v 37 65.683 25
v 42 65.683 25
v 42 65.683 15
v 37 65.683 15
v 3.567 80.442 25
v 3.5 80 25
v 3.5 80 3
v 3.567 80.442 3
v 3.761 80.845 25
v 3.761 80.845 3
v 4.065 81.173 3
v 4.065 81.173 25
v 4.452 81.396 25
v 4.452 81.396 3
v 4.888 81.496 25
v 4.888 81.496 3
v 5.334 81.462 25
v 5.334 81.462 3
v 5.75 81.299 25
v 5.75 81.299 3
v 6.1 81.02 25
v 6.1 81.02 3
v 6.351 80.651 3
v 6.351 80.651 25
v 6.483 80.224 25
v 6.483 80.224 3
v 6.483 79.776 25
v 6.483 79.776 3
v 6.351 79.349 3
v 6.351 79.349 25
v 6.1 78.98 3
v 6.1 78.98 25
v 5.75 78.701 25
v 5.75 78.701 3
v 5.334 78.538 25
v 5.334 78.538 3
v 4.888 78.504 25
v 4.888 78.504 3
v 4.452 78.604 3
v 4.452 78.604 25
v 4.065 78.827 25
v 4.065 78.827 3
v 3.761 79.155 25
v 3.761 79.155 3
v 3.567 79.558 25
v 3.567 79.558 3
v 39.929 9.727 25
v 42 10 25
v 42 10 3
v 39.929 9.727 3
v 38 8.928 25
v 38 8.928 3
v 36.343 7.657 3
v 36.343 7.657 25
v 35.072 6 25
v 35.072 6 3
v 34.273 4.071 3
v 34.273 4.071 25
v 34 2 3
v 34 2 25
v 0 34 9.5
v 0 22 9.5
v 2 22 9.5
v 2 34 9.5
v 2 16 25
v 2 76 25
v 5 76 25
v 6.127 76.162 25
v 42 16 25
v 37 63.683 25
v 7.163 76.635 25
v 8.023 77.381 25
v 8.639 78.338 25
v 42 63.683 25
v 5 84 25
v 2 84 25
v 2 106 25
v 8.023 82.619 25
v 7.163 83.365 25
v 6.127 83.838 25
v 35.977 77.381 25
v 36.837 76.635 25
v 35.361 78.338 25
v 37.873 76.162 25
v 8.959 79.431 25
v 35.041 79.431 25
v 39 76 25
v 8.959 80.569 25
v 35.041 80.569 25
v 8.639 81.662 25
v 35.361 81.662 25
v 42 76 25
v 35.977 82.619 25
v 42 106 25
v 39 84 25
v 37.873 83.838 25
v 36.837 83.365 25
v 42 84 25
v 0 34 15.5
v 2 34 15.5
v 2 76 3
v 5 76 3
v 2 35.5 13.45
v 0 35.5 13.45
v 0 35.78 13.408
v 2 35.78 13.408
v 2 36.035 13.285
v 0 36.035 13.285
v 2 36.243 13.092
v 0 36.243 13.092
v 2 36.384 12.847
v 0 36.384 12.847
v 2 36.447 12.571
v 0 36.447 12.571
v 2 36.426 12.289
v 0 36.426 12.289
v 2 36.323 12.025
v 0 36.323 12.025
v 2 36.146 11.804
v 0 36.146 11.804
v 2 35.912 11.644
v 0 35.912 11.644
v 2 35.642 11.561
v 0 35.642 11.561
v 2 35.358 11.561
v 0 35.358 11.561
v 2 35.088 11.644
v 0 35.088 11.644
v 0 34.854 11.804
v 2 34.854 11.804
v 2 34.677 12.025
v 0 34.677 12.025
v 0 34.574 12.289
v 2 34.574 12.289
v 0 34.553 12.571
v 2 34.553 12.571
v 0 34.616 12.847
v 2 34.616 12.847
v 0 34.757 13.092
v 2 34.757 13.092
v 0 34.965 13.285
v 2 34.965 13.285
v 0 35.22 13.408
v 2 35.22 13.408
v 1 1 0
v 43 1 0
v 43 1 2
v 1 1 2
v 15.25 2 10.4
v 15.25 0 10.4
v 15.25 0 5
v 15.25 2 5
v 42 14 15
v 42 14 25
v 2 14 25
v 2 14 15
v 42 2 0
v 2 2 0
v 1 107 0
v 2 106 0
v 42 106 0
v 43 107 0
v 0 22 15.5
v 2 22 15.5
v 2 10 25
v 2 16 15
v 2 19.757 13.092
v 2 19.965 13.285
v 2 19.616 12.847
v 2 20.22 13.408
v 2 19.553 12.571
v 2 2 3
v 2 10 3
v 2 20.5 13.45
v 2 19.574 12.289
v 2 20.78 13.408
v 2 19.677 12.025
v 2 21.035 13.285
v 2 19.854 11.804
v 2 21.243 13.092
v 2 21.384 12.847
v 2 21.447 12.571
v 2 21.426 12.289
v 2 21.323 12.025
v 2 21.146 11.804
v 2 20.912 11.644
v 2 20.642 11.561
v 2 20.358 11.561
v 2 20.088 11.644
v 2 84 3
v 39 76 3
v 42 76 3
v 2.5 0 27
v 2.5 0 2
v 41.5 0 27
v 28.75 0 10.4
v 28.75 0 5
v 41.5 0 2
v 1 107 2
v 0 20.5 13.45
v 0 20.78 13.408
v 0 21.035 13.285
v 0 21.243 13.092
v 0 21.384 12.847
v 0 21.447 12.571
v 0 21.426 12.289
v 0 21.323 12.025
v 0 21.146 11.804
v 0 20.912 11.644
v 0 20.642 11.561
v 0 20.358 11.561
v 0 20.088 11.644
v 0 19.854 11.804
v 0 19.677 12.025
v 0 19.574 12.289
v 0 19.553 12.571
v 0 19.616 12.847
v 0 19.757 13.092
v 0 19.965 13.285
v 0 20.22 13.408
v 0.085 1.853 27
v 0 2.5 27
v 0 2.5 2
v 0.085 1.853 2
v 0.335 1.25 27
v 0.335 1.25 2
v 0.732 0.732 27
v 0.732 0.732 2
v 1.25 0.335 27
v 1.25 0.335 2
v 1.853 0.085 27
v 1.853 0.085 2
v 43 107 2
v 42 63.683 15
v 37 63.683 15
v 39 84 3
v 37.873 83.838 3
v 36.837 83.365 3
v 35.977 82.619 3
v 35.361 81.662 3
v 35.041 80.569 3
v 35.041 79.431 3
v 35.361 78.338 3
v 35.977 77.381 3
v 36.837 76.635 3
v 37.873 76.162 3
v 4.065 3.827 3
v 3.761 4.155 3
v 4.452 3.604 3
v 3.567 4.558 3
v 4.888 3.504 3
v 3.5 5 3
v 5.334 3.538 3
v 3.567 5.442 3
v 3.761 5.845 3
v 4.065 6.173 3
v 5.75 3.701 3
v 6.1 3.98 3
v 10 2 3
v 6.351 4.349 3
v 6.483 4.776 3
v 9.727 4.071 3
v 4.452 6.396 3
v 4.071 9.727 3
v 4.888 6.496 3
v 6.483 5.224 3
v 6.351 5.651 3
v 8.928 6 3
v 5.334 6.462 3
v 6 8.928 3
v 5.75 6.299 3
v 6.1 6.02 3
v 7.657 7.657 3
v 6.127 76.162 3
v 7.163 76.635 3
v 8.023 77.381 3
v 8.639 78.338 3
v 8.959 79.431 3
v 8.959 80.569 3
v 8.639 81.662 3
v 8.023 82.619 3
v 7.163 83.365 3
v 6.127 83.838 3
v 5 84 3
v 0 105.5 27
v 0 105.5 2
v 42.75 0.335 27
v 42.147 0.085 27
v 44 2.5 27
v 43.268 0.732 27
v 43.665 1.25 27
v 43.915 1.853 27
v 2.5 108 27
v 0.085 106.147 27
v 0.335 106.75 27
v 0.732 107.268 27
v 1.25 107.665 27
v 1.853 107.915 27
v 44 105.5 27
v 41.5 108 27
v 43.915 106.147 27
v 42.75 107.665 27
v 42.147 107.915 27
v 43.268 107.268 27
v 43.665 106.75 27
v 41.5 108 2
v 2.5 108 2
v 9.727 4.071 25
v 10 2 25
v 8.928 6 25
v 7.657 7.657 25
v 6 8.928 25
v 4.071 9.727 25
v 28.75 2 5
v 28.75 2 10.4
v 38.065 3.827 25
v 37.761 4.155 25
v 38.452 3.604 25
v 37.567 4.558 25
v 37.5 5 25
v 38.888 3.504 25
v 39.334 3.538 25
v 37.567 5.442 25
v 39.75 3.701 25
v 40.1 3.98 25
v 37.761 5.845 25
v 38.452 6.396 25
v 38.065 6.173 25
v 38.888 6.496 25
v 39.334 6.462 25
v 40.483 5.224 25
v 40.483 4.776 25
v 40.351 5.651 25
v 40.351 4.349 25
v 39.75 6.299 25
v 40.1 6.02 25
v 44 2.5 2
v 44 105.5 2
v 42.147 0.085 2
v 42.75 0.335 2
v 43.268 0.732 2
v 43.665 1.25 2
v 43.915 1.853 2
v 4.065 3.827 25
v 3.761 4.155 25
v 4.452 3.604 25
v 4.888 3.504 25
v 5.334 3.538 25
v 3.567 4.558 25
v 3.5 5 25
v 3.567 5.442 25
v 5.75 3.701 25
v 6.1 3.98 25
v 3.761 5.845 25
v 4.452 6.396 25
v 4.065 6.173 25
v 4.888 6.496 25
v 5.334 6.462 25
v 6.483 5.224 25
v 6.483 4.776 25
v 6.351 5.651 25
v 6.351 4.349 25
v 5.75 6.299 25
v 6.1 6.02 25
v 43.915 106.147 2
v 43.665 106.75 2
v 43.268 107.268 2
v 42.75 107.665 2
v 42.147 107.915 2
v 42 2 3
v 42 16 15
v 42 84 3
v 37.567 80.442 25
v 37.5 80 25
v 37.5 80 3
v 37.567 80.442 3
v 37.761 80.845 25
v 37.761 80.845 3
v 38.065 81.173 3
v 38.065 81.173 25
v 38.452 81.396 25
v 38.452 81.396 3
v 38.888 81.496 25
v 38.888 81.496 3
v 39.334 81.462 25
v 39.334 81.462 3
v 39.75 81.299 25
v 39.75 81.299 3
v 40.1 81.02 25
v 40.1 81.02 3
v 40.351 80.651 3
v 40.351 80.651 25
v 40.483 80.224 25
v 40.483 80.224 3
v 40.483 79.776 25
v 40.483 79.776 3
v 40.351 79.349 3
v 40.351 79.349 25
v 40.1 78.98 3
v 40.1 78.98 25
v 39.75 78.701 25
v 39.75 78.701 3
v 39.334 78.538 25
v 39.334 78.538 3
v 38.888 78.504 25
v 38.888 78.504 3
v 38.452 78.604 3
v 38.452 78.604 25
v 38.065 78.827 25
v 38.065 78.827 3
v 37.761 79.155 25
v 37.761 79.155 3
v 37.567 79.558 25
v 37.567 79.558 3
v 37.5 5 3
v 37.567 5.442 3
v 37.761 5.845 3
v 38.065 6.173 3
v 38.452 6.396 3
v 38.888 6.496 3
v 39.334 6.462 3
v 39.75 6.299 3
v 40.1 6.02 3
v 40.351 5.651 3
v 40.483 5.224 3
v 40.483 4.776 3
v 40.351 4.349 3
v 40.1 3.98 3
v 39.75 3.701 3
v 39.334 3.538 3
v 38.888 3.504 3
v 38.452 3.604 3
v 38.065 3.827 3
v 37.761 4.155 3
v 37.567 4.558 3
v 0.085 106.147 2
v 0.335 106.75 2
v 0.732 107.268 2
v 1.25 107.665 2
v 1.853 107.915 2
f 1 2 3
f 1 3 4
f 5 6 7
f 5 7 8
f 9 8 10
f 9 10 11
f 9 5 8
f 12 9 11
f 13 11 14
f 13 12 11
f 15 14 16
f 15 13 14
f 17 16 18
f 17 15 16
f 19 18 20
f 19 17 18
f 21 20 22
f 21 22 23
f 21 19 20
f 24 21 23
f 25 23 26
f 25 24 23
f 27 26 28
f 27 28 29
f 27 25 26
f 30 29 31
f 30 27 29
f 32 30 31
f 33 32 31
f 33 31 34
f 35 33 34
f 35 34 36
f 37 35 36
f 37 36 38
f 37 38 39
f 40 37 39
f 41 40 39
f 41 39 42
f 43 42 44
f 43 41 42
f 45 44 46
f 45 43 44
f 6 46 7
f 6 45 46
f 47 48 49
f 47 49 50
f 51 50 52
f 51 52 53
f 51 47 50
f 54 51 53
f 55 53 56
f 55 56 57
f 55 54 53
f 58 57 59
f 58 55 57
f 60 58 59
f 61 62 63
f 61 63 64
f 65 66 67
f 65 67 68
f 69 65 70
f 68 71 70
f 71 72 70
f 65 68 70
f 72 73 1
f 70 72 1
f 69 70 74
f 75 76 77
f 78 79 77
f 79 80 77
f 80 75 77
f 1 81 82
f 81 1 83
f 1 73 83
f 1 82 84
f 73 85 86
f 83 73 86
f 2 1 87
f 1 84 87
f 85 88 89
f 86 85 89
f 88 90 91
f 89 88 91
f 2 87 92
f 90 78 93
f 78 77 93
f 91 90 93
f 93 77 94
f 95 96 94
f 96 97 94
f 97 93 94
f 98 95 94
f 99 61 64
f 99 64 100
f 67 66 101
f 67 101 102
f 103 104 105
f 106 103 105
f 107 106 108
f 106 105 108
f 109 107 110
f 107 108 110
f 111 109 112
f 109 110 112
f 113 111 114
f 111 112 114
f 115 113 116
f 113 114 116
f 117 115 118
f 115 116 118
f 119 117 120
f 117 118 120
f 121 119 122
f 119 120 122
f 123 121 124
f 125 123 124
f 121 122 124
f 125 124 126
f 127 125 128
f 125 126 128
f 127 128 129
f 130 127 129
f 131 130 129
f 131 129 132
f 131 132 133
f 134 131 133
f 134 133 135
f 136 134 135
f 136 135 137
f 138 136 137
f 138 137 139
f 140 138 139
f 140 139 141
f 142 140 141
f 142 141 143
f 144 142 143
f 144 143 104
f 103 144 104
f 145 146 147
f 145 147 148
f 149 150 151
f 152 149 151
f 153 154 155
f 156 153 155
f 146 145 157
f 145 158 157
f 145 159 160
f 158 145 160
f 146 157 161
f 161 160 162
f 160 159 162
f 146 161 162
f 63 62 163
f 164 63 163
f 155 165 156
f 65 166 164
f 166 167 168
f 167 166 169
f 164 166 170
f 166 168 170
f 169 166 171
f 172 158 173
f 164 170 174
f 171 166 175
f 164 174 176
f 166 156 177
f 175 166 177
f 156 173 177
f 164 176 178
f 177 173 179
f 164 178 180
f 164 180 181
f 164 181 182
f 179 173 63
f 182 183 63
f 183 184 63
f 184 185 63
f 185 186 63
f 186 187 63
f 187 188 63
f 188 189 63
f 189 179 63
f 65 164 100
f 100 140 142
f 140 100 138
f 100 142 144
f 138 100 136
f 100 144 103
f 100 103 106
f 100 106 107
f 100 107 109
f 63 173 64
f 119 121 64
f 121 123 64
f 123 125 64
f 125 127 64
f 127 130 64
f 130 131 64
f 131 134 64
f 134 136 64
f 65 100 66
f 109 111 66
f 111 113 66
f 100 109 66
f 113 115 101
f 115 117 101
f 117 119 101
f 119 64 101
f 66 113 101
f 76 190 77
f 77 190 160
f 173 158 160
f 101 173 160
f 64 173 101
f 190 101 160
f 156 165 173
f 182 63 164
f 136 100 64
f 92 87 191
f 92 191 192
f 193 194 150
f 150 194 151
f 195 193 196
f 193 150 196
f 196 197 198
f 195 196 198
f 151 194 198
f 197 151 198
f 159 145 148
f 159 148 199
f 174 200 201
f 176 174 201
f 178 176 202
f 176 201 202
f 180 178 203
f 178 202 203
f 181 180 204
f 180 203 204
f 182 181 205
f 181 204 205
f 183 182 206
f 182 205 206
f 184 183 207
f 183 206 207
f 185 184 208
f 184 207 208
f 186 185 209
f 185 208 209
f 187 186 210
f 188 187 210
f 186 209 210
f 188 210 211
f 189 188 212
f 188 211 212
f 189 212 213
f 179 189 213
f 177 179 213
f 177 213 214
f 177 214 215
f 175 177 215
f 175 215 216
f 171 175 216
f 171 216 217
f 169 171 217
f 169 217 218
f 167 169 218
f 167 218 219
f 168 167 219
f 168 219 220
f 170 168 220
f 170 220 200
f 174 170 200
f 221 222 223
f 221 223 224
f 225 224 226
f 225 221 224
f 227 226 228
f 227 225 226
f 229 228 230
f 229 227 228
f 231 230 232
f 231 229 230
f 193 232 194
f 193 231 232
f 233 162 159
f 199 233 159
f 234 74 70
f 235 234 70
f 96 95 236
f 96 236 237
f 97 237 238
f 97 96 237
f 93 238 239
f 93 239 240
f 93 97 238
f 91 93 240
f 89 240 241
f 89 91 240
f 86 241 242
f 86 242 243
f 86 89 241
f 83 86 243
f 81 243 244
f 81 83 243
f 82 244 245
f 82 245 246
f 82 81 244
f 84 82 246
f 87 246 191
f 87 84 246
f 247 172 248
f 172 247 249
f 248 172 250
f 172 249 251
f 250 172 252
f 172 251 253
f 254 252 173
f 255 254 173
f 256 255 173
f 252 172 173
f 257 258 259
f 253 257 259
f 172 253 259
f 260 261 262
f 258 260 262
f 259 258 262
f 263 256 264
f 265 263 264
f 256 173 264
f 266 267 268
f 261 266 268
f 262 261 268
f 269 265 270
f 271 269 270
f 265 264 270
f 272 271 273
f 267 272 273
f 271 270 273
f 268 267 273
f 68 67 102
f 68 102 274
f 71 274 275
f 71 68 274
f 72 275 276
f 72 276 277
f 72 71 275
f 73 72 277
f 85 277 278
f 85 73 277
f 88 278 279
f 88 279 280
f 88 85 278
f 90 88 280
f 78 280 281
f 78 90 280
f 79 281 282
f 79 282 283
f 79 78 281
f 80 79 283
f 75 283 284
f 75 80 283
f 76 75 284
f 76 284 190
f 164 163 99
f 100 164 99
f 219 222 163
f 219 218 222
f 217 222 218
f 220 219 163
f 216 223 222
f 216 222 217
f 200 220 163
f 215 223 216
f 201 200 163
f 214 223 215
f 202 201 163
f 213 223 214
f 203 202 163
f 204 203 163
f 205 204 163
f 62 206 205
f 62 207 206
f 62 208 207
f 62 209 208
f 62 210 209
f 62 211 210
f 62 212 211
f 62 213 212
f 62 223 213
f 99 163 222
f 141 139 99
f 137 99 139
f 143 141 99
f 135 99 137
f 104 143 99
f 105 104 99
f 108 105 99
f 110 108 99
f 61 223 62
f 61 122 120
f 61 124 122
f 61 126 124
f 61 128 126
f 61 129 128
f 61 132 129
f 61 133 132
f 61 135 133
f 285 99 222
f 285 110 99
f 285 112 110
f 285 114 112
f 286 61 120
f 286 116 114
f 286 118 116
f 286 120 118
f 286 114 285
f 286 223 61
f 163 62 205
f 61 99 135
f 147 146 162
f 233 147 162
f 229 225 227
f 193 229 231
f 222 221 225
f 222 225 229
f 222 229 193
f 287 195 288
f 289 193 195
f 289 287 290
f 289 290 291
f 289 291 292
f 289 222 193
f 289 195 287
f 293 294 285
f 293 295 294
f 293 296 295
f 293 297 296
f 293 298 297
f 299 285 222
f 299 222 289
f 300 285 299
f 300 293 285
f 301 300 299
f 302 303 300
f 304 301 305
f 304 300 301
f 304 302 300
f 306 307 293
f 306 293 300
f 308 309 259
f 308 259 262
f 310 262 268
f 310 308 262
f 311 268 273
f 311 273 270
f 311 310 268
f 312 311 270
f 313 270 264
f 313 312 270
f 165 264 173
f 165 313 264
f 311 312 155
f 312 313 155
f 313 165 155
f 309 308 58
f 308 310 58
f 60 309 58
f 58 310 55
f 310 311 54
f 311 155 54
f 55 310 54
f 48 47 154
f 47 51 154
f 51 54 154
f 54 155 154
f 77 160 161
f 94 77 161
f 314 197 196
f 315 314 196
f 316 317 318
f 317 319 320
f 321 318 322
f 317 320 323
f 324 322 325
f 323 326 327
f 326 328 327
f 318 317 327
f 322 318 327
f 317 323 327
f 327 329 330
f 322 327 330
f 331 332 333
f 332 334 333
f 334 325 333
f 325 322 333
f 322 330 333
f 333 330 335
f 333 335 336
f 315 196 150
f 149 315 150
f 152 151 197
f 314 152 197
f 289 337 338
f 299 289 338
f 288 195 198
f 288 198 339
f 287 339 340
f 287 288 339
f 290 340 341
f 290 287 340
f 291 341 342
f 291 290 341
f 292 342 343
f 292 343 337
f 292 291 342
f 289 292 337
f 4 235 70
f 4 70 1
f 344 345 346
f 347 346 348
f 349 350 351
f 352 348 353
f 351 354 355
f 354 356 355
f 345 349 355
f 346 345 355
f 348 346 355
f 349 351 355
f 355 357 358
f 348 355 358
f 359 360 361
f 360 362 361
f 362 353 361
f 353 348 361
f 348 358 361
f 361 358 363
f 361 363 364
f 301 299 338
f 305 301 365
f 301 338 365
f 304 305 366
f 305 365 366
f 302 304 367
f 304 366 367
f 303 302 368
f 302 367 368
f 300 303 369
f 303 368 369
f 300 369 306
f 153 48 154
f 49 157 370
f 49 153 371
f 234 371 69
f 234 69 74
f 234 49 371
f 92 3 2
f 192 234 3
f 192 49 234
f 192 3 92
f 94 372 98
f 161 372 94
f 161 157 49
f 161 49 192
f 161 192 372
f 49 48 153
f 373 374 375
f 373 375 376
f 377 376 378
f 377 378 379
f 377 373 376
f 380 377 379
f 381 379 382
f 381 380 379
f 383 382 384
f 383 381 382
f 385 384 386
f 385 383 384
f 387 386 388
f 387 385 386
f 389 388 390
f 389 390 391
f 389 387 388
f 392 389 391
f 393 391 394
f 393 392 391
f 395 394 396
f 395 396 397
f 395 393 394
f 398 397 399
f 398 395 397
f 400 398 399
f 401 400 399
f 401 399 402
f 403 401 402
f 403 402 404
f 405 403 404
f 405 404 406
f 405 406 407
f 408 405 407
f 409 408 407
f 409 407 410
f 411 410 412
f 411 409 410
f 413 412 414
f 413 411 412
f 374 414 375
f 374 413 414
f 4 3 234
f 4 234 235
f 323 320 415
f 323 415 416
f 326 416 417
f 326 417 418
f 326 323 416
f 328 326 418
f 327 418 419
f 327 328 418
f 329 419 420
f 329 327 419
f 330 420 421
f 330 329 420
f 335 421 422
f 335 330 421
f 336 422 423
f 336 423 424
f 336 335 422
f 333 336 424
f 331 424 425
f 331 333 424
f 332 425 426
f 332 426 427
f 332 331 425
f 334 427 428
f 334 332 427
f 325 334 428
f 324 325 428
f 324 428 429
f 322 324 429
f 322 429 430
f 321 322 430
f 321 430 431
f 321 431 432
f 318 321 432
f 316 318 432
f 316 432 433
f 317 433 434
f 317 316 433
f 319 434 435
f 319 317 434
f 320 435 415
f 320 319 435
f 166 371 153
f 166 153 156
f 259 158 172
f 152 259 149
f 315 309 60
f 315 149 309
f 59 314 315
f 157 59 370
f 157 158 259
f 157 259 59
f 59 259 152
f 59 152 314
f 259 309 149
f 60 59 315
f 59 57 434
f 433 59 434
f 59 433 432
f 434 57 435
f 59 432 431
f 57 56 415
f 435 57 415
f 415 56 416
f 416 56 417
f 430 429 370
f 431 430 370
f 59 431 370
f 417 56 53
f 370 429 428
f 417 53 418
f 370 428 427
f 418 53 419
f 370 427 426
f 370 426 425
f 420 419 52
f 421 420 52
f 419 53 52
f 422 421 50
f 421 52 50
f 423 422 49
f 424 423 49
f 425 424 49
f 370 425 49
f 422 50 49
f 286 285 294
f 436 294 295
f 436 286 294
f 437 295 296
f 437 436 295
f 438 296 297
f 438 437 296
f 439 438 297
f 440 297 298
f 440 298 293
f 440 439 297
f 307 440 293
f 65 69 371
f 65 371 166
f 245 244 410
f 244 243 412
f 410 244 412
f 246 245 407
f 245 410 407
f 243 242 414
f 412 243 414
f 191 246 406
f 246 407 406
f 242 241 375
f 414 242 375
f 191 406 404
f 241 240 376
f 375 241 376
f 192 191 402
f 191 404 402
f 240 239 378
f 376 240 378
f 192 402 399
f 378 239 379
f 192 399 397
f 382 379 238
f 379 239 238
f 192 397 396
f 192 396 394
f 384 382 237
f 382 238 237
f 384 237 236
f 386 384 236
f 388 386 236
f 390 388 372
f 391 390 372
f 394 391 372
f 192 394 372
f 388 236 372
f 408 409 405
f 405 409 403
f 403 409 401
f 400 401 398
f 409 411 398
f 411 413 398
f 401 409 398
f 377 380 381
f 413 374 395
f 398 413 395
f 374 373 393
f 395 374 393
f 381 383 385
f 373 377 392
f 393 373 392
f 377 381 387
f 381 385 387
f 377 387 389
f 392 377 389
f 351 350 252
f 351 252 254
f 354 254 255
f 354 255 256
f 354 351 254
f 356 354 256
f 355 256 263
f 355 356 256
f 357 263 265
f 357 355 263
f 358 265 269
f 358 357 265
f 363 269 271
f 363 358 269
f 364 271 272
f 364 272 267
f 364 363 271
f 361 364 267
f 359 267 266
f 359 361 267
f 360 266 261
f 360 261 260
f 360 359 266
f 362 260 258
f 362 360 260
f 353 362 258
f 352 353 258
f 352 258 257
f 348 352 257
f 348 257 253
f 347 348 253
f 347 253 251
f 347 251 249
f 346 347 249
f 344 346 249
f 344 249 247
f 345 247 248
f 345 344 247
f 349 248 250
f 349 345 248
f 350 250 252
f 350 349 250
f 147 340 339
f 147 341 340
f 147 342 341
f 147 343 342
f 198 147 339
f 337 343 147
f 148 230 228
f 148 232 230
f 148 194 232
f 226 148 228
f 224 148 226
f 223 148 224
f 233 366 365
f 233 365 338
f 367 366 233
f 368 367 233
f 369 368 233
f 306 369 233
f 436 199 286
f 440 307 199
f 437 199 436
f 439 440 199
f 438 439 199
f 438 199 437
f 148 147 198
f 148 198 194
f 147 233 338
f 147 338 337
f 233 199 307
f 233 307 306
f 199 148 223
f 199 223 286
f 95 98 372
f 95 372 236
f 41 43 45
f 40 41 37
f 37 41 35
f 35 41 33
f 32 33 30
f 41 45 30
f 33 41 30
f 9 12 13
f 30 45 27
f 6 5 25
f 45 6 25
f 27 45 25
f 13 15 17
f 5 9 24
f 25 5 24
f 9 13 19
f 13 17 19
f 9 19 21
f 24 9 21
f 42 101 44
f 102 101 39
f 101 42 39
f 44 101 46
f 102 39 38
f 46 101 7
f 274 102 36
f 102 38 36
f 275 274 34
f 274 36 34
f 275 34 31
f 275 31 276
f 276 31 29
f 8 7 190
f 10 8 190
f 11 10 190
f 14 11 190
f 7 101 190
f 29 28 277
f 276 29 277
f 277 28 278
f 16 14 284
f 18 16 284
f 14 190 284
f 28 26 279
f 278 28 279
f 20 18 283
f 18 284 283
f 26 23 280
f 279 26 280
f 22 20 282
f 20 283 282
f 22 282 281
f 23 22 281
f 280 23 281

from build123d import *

# Parameters (mm, degrees)
SKICA1_W                 = 44
SKICA1_H                 = 108
SKICA1_W_2               = 40
SKICA1_H_2               = 104
P_IDAT_VYSUNUT_M1_DEPTH  = 25
SKICA2_W                 = 44
SKICA2_H                 = 108
P_IDAT_VYSUNUT_M2_DEPTH  = 2
ZAOBLIT1_R               = 2.5
SKICA3_W                 = 44
SKICA3_H                 = 108
SKICA3_W_2               = 42
SKICA3_H_2               = 106
ODEBRAT_VYSUNUT_M1_DEPTH = 2
SKICA4_R                 = 1.5
P_IDAT_VYSUNUT_M3_DEPTH  = 22
ODEBRAT_VYSUNUT_M2_DEPTH = 10
SKICA7_W                 = 40
SKICA7_H                 = 2
SKICA7_W_2               = 5
P_IDAT_VYSUNUT_M4_DEPTH  = 10
SKICA8_R                 = 0.95
SKICA8_W                 = 6
SKICA8_H                 = 12
ODEBRAT_VYSUNUT_M3_DEPTH = 10


with BuildPart() as part:
    # Skica1 → Přidat vysunutím1 (new body)
    with BuildSketch(Plane.XY):
        with Locations((22, 54)):
            Rectangle(SKICA1_W, SKICA1_H)
        with Locations((22, 54)):
            Rectangle(SKICA1_W_2, SKICA1_H_2, mode=Mode.SUBTRACT)
    extrude(amount=P_IDAT_VYSUNUT_M1_DEPTH)

    # Skica2 → Přidat vysunutím2 (add)
    with BuildSketch(Plane.XY.offset(25)):
        with Locations((22, 54)):
            Rectangle(SKICA2_W, SKICA2_H)
    extrude(amount=P_IDAT_VYSUNUT_M2_DEPTH)

    # Zaoblit1
    zaoblit1_edges = [part.edges().sort_by_distance(p)[0] for p in [
        (0, 108, 13.5),
        (44, 108, 13.5),
        (44, 0, 13.5),
        (0, 0, 13.5),
    ]]
    fillet(zaoblit1_edges, radius=ZAOBLIT1_R)

    # Skica3 → Odebrat vysunutím1 (cut)
    with BuildSketch(Plane(origin=(0, 0, 0), x_dir=(-1, 0, 0), z_dir=(0, 0, -1))):
        with Locations((-22, 54)):
            Rectangle(SKICA3_W, SKICA3_H)
        with Locations((-22, 54)):
            Rectangle(SKICA3_W_2, SKICA3_H_2, mode=Mode.SUBTRACT)
    extrude(amount=-ODEBRAT_VYSUNUT_M1_DEPTH, mode=Mode.SUBTRACT)

    # Skica4 → Přidat vysunutím3 (add)
    with BuildSketch(Plane(origin=(0, 0, 25), x_dir=(-1, 0, 0), z_dir=(0, 0, -1))):
        with BuildLine():
            Line((-42, 2), (-42, 10))
            ThreePointArc((-42, 10), (-36.343145751, 7.656854249), (-34, 2))
            Line((-34, 2), (-42, 2))
        make_face()
        with Locations((-39, 5)):
            Circle(SKICA4_R, mode=Mode.SUBTRACT)
        with BuildLine():
            Line((-2, 2), (-10, 2))
            ThreePointArc((-10, 2), (-7.656854249, 7.656854249), (-2, 10))
            Line((-2, 10), (-2, 2))
        make_face()
        with Locations((-5, 5)):
            Circle(SKICA4_R, mode=Mode.SUBTRACT)
        with BuildLine():
            Line((-2, 80), (-2, 76))
            Line((-2, 76), (-5, 76))
            ThreePointArc((-5, 76), (-9, 80), (-5, 84))
            Line((-5, 84), (-2, 84))
            Line((-2, 84), (-2, 80))
        make_face()
        with Locations((-5, 80)):
            Circle(SKICA4_R, mode=Mode.SUBTRACT)
        with BuildLine():
            Line((-42, 84), (-39, 84))
            ThreePointArc((-39, 84), (-35, 80), (-39, 76))
            Line((-39, 76), (-42, 76))
            Line((-42, 76), (-42, 84))
        make_face()
        with Locations((-39, 80)):
            Circle(SKICA4_R, mode=Mode.SUBTRACT)
    extrude(amount=P_IDAT_VYSUNUT_M3_DEPTH)

    # Skica6 → Odebrat vysunutím2 (cut)
    with BuildSketch(Plane.XZ):
        Polygon((22, 10.4), (15.25, 10.4), (15.25, 5), (28.75, 5), (28.75, 10.4), align=None)
    extrude(amount=-ODEBRAT_VYSUNUT_M2_DEPTH, mode=Mode.SUBTRACT)

    # Skica7 → Přidat vysunutím4 (add)
    with BuildSketch(Plane(origin=(0, 0, 25), x_dir=(-1, 0, 0), z_dir=(0, 0, -1))):
        with Locations((-22, 15)):
            Rectangle(SKICA7_W, SKICA7_H)
        with Locations((-39.5, 64.682971934)):
            Rectangle(SKICA7_W_2, SKICA7_H)
    extrude(amount=P_IDAT_VYSUNUT_M4_DEPTH)

    # Skica8 → Odebrat vysunutím3 (cut)
    with BuildSketch(Plane.ZY):
        with Locations((12.5, 35.5)):
            Circle(SKICA8_R)
        with Locations((12.5, 20.5)):
            Circle(SKICA8_R)
        with Locations((12.5, 28)):
            Rectangle(SKICA8_W, SKICA8_H)
    extrude(amount=-ODEBRAT_VYSUNUT_M3_DEPTH, mode=Mode.SUBTRACT)


solid = part.part
